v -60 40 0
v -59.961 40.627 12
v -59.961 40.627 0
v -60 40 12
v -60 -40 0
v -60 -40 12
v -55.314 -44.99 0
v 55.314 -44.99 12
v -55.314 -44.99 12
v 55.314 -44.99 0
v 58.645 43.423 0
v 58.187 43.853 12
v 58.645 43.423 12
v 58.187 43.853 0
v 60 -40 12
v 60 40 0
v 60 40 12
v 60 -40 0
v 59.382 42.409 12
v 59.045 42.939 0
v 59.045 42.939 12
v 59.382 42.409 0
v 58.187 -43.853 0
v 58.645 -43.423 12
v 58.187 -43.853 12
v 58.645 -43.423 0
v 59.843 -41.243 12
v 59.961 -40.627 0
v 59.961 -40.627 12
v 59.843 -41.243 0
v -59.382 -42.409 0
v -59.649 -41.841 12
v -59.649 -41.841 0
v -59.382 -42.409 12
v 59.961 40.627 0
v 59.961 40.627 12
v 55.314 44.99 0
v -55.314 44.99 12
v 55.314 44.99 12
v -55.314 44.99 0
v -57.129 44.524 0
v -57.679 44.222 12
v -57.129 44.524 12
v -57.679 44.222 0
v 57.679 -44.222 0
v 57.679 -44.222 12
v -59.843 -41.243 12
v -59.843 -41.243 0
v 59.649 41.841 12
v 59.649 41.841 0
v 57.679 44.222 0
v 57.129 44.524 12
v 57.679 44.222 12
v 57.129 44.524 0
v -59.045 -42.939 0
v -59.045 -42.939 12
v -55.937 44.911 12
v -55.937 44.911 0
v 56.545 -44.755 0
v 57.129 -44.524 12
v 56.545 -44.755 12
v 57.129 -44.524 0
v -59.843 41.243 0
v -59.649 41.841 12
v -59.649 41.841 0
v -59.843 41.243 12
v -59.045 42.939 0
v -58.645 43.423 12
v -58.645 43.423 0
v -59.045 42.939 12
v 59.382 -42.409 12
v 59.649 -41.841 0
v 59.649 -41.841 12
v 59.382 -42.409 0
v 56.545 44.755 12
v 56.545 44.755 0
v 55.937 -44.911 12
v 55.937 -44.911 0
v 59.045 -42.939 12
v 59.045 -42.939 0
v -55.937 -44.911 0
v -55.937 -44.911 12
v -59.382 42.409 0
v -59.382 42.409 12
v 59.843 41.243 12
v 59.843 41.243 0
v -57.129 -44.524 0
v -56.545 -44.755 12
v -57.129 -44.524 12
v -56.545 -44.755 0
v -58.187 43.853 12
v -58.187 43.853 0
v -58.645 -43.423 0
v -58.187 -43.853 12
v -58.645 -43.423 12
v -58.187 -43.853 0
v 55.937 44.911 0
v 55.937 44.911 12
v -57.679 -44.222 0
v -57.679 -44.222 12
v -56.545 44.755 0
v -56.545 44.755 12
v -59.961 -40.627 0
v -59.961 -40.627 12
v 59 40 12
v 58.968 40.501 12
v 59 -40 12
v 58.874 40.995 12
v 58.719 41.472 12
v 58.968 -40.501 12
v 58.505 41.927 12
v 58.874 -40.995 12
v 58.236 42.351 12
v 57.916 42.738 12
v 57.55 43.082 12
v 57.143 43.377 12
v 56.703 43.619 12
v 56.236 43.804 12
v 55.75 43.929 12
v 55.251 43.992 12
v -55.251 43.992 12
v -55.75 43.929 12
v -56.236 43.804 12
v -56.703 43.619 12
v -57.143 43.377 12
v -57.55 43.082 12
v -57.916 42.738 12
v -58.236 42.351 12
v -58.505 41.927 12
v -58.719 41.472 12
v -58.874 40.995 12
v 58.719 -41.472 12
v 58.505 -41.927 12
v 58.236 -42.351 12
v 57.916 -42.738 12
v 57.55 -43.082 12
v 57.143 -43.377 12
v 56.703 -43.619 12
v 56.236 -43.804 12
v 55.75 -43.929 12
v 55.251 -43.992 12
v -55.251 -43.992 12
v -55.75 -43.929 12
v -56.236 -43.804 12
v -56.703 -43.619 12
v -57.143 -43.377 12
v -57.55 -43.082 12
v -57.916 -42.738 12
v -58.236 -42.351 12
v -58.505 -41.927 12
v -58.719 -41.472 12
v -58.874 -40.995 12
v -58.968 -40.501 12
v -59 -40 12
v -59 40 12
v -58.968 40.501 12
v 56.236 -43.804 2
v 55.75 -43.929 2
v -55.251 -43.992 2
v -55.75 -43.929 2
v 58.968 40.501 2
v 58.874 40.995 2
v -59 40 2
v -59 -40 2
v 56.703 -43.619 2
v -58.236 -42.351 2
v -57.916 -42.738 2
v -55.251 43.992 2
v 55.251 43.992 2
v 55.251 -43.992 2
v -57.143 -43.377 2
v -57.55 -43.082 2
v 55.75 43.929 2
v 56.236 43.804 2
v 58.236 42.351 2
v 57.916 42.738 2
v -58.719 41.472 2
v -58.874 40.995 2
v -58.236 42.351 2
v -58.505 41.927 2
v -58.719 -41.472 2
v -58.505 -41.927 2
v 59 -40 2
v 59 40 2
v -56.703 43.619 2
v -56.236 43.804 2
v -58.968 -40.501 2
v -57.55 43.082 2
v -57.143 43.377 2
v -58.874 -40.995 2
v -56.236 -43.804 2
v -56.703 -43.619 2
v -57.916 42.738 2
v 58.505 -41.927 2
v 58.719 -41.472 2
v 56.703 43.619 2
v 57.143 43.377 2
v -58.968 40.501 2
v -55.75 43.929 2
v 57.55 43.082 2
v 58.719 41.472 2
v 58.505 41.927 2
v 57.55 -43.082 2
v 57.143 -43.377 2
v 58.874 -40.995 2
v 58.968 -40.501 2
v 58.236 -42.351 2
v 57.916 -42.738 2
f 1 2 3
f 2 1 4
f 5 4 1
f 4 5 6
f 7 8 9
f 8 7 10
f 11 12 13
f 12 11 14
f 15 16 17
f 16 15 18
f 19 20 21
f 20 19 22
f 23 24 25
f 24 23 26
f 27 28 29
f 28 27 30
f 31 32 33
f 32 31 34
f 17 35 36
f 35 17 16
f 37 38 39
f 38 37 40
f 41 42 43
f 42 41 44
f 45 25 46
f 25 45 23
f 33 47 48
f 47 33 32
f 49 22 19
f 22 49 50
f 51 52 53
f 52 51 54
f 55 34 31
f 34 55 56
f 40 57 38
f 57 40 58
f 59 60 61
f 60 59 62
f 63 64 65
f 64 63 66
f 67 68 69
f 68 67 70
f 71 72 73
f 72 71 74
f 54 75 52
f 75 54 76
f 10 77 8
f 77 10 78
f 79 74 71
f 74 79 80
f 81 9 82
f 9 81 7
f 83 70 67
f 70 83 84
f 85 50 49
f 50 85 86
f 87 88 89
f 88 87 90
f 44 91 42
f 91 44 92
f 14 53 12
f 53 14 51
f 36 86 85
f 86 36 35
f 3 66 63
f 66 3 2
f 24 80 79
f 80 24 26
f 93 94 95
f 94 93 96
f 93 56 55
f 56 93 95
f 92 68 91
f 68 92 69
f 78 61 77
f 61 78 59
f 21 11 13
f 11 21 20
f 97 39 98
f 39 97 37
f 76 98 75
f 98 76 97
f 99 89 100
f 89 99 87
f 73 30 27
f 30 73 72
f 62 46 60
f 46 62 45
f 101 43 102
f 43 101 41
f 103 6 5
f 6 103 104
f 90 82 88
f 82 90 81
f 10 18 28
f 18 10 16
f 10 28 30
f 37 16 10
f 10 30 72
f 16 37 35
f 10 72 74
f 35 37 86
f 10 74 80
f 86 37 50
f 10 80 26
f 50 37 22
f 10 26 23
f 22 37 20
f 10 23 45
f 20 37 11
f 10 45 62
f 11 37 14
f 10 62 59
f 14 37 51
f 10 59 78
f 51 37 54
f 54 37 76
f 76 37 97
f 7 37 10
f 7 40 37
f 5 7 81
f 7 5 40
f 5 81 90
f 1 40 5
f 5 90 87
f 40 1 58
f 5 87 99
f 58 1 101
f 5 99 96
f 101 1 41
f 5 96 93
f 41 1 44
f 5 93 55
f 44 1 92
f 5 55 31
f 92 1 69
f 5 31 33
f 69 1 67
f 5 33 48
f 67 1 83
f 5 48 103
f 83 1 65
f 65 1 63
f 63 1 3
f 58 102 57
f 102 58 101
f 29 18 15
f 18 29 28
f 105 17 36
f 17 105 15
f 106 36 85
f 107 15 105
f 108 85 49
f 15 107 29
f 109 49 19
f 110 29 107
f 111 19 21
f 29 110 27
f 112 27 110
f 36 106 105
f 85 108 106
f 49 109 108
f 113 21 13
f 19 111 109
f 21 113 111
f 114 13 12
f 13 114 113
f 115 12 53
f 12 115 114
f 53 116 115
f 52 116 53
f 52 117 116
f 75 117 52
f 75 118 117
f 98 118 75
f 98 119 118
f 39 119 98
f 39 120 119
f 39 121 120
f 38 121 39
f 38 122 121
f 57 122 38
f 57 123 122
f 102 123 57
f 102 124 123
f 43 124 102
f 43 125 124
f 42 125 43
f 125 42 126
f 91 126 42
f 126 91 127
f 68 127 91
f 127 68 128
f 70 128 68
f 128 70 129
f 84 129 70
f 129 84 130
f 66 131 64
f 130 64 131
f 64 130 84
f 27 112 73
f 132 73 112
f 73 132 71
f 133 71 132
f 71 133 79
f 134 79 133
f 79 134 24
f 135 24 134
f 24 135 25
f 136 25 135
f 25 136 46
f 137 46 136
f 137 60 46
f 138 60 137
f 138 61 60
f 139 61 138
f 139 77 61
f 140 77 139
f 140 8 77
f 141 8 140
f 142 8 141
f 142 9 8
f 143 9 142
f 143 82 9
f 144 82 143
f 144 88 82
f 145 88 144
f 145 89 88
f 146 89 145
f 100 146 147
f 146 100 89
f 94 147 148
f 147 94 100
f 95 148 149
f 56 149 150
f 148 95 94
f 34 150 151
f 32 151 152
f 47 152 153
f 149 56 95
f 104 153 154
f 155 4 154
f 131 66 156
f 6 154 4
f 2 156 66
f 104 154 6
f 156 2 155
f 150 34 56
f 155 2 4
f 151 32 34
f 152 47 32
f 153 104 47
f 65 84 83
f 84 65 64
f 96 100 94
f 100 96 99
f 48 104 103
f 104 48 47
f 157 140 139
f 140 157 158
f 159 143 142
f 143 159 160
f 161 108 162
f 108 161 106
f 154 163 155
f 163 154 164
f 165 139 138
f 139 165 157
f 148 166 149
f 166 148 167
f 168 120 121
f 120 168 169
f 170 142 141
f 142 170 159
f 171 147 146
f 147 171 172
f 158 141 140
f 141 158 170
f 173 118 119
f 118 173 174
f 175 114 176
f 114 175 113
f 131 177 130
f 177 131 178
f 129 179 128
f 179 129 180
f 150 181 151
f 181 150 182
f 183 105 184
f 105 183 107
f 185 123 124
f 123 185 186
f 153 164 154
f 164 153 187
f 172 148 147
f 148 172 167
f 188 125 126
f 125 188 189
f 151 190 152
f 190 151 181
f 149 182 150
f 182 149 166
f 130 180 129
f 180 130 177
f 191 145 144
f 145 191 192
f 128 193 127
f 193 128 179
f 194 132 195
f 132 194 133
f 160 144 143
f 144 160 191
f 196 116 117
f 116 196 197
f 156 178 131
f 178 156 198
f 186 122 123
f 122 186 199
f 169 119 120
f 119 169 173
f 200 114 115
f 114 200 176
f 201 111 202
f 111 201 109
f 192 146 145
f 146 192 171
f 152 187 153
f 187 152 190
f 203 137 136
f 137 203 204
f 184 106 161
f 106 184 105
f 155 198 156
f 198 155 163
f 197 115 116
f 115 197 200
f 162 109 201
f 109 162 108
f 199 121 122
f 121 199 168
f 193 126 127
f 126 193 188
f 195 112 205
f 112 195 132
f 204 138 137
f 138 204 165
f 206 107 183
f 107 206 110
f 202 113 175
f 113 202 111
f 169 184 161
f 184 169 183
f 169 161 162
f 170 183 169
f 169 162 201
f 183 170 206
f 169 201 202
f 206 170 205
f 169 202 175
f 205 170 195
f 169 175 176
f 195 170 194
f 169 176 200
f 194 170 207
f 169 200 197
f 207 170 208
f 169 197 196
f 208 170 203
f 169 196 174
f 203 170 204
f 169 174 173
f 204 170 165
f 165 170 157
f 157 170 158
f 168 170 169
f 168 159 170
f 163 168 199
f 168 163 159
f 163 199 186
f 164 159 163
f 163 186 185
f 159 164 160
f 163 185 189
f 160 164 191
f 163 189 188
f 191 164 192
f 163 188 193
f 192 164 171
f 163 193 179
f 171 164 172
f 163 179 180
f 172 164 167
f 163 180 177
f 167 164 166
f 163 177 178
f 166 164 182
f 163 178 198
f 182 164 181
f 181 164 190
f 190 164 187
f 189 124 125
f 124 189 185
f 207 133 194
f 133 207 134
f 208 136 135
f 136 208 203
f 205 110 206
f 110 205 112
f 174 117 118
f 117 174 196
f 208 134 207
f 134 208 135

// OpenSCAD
$fn = 50;


difference() {
	union() {
		hull() {
			translate(v = [-55.0000000000, 40.0000000000, 0]) {
				cylinder(h = 12, r = 5);
			}
			translate(v = [55.0000000000, 40.0000000000, 0]) {
				cylinder(h = 12, r = 5);
			}
			translate(v = [-55.0000000000, -40.0000000000, 0]) {
				cylinder(h = 12, r = 5);
			}
			translate(v = [55.0000000000, -40.0000000000, 0]) {
				cylinder(h = 12, r = 5);
			}
		}
	}
	union() {
		translate(v = [0, 0, 2]) {
			hull() {
				translate(v = [-55.0000000000, 40.0000000000, 0]) {
					cylinder(h = 10, r = 4);
				}
				translate(v = [55.0000000000, 40.0000000000, 0]) {
					cylinder(h = 10, r = 4);
				}
				translate(v = [-55.0000000000, -40.0000000000, 0]) {
					cylinder(h = 10, r = 4);
				}
				translate(v = [55.0000000000, -40.0000000000, 0]) {
					cylinder(h = 10, r = 4);
				}
			}
		}
	}
}
